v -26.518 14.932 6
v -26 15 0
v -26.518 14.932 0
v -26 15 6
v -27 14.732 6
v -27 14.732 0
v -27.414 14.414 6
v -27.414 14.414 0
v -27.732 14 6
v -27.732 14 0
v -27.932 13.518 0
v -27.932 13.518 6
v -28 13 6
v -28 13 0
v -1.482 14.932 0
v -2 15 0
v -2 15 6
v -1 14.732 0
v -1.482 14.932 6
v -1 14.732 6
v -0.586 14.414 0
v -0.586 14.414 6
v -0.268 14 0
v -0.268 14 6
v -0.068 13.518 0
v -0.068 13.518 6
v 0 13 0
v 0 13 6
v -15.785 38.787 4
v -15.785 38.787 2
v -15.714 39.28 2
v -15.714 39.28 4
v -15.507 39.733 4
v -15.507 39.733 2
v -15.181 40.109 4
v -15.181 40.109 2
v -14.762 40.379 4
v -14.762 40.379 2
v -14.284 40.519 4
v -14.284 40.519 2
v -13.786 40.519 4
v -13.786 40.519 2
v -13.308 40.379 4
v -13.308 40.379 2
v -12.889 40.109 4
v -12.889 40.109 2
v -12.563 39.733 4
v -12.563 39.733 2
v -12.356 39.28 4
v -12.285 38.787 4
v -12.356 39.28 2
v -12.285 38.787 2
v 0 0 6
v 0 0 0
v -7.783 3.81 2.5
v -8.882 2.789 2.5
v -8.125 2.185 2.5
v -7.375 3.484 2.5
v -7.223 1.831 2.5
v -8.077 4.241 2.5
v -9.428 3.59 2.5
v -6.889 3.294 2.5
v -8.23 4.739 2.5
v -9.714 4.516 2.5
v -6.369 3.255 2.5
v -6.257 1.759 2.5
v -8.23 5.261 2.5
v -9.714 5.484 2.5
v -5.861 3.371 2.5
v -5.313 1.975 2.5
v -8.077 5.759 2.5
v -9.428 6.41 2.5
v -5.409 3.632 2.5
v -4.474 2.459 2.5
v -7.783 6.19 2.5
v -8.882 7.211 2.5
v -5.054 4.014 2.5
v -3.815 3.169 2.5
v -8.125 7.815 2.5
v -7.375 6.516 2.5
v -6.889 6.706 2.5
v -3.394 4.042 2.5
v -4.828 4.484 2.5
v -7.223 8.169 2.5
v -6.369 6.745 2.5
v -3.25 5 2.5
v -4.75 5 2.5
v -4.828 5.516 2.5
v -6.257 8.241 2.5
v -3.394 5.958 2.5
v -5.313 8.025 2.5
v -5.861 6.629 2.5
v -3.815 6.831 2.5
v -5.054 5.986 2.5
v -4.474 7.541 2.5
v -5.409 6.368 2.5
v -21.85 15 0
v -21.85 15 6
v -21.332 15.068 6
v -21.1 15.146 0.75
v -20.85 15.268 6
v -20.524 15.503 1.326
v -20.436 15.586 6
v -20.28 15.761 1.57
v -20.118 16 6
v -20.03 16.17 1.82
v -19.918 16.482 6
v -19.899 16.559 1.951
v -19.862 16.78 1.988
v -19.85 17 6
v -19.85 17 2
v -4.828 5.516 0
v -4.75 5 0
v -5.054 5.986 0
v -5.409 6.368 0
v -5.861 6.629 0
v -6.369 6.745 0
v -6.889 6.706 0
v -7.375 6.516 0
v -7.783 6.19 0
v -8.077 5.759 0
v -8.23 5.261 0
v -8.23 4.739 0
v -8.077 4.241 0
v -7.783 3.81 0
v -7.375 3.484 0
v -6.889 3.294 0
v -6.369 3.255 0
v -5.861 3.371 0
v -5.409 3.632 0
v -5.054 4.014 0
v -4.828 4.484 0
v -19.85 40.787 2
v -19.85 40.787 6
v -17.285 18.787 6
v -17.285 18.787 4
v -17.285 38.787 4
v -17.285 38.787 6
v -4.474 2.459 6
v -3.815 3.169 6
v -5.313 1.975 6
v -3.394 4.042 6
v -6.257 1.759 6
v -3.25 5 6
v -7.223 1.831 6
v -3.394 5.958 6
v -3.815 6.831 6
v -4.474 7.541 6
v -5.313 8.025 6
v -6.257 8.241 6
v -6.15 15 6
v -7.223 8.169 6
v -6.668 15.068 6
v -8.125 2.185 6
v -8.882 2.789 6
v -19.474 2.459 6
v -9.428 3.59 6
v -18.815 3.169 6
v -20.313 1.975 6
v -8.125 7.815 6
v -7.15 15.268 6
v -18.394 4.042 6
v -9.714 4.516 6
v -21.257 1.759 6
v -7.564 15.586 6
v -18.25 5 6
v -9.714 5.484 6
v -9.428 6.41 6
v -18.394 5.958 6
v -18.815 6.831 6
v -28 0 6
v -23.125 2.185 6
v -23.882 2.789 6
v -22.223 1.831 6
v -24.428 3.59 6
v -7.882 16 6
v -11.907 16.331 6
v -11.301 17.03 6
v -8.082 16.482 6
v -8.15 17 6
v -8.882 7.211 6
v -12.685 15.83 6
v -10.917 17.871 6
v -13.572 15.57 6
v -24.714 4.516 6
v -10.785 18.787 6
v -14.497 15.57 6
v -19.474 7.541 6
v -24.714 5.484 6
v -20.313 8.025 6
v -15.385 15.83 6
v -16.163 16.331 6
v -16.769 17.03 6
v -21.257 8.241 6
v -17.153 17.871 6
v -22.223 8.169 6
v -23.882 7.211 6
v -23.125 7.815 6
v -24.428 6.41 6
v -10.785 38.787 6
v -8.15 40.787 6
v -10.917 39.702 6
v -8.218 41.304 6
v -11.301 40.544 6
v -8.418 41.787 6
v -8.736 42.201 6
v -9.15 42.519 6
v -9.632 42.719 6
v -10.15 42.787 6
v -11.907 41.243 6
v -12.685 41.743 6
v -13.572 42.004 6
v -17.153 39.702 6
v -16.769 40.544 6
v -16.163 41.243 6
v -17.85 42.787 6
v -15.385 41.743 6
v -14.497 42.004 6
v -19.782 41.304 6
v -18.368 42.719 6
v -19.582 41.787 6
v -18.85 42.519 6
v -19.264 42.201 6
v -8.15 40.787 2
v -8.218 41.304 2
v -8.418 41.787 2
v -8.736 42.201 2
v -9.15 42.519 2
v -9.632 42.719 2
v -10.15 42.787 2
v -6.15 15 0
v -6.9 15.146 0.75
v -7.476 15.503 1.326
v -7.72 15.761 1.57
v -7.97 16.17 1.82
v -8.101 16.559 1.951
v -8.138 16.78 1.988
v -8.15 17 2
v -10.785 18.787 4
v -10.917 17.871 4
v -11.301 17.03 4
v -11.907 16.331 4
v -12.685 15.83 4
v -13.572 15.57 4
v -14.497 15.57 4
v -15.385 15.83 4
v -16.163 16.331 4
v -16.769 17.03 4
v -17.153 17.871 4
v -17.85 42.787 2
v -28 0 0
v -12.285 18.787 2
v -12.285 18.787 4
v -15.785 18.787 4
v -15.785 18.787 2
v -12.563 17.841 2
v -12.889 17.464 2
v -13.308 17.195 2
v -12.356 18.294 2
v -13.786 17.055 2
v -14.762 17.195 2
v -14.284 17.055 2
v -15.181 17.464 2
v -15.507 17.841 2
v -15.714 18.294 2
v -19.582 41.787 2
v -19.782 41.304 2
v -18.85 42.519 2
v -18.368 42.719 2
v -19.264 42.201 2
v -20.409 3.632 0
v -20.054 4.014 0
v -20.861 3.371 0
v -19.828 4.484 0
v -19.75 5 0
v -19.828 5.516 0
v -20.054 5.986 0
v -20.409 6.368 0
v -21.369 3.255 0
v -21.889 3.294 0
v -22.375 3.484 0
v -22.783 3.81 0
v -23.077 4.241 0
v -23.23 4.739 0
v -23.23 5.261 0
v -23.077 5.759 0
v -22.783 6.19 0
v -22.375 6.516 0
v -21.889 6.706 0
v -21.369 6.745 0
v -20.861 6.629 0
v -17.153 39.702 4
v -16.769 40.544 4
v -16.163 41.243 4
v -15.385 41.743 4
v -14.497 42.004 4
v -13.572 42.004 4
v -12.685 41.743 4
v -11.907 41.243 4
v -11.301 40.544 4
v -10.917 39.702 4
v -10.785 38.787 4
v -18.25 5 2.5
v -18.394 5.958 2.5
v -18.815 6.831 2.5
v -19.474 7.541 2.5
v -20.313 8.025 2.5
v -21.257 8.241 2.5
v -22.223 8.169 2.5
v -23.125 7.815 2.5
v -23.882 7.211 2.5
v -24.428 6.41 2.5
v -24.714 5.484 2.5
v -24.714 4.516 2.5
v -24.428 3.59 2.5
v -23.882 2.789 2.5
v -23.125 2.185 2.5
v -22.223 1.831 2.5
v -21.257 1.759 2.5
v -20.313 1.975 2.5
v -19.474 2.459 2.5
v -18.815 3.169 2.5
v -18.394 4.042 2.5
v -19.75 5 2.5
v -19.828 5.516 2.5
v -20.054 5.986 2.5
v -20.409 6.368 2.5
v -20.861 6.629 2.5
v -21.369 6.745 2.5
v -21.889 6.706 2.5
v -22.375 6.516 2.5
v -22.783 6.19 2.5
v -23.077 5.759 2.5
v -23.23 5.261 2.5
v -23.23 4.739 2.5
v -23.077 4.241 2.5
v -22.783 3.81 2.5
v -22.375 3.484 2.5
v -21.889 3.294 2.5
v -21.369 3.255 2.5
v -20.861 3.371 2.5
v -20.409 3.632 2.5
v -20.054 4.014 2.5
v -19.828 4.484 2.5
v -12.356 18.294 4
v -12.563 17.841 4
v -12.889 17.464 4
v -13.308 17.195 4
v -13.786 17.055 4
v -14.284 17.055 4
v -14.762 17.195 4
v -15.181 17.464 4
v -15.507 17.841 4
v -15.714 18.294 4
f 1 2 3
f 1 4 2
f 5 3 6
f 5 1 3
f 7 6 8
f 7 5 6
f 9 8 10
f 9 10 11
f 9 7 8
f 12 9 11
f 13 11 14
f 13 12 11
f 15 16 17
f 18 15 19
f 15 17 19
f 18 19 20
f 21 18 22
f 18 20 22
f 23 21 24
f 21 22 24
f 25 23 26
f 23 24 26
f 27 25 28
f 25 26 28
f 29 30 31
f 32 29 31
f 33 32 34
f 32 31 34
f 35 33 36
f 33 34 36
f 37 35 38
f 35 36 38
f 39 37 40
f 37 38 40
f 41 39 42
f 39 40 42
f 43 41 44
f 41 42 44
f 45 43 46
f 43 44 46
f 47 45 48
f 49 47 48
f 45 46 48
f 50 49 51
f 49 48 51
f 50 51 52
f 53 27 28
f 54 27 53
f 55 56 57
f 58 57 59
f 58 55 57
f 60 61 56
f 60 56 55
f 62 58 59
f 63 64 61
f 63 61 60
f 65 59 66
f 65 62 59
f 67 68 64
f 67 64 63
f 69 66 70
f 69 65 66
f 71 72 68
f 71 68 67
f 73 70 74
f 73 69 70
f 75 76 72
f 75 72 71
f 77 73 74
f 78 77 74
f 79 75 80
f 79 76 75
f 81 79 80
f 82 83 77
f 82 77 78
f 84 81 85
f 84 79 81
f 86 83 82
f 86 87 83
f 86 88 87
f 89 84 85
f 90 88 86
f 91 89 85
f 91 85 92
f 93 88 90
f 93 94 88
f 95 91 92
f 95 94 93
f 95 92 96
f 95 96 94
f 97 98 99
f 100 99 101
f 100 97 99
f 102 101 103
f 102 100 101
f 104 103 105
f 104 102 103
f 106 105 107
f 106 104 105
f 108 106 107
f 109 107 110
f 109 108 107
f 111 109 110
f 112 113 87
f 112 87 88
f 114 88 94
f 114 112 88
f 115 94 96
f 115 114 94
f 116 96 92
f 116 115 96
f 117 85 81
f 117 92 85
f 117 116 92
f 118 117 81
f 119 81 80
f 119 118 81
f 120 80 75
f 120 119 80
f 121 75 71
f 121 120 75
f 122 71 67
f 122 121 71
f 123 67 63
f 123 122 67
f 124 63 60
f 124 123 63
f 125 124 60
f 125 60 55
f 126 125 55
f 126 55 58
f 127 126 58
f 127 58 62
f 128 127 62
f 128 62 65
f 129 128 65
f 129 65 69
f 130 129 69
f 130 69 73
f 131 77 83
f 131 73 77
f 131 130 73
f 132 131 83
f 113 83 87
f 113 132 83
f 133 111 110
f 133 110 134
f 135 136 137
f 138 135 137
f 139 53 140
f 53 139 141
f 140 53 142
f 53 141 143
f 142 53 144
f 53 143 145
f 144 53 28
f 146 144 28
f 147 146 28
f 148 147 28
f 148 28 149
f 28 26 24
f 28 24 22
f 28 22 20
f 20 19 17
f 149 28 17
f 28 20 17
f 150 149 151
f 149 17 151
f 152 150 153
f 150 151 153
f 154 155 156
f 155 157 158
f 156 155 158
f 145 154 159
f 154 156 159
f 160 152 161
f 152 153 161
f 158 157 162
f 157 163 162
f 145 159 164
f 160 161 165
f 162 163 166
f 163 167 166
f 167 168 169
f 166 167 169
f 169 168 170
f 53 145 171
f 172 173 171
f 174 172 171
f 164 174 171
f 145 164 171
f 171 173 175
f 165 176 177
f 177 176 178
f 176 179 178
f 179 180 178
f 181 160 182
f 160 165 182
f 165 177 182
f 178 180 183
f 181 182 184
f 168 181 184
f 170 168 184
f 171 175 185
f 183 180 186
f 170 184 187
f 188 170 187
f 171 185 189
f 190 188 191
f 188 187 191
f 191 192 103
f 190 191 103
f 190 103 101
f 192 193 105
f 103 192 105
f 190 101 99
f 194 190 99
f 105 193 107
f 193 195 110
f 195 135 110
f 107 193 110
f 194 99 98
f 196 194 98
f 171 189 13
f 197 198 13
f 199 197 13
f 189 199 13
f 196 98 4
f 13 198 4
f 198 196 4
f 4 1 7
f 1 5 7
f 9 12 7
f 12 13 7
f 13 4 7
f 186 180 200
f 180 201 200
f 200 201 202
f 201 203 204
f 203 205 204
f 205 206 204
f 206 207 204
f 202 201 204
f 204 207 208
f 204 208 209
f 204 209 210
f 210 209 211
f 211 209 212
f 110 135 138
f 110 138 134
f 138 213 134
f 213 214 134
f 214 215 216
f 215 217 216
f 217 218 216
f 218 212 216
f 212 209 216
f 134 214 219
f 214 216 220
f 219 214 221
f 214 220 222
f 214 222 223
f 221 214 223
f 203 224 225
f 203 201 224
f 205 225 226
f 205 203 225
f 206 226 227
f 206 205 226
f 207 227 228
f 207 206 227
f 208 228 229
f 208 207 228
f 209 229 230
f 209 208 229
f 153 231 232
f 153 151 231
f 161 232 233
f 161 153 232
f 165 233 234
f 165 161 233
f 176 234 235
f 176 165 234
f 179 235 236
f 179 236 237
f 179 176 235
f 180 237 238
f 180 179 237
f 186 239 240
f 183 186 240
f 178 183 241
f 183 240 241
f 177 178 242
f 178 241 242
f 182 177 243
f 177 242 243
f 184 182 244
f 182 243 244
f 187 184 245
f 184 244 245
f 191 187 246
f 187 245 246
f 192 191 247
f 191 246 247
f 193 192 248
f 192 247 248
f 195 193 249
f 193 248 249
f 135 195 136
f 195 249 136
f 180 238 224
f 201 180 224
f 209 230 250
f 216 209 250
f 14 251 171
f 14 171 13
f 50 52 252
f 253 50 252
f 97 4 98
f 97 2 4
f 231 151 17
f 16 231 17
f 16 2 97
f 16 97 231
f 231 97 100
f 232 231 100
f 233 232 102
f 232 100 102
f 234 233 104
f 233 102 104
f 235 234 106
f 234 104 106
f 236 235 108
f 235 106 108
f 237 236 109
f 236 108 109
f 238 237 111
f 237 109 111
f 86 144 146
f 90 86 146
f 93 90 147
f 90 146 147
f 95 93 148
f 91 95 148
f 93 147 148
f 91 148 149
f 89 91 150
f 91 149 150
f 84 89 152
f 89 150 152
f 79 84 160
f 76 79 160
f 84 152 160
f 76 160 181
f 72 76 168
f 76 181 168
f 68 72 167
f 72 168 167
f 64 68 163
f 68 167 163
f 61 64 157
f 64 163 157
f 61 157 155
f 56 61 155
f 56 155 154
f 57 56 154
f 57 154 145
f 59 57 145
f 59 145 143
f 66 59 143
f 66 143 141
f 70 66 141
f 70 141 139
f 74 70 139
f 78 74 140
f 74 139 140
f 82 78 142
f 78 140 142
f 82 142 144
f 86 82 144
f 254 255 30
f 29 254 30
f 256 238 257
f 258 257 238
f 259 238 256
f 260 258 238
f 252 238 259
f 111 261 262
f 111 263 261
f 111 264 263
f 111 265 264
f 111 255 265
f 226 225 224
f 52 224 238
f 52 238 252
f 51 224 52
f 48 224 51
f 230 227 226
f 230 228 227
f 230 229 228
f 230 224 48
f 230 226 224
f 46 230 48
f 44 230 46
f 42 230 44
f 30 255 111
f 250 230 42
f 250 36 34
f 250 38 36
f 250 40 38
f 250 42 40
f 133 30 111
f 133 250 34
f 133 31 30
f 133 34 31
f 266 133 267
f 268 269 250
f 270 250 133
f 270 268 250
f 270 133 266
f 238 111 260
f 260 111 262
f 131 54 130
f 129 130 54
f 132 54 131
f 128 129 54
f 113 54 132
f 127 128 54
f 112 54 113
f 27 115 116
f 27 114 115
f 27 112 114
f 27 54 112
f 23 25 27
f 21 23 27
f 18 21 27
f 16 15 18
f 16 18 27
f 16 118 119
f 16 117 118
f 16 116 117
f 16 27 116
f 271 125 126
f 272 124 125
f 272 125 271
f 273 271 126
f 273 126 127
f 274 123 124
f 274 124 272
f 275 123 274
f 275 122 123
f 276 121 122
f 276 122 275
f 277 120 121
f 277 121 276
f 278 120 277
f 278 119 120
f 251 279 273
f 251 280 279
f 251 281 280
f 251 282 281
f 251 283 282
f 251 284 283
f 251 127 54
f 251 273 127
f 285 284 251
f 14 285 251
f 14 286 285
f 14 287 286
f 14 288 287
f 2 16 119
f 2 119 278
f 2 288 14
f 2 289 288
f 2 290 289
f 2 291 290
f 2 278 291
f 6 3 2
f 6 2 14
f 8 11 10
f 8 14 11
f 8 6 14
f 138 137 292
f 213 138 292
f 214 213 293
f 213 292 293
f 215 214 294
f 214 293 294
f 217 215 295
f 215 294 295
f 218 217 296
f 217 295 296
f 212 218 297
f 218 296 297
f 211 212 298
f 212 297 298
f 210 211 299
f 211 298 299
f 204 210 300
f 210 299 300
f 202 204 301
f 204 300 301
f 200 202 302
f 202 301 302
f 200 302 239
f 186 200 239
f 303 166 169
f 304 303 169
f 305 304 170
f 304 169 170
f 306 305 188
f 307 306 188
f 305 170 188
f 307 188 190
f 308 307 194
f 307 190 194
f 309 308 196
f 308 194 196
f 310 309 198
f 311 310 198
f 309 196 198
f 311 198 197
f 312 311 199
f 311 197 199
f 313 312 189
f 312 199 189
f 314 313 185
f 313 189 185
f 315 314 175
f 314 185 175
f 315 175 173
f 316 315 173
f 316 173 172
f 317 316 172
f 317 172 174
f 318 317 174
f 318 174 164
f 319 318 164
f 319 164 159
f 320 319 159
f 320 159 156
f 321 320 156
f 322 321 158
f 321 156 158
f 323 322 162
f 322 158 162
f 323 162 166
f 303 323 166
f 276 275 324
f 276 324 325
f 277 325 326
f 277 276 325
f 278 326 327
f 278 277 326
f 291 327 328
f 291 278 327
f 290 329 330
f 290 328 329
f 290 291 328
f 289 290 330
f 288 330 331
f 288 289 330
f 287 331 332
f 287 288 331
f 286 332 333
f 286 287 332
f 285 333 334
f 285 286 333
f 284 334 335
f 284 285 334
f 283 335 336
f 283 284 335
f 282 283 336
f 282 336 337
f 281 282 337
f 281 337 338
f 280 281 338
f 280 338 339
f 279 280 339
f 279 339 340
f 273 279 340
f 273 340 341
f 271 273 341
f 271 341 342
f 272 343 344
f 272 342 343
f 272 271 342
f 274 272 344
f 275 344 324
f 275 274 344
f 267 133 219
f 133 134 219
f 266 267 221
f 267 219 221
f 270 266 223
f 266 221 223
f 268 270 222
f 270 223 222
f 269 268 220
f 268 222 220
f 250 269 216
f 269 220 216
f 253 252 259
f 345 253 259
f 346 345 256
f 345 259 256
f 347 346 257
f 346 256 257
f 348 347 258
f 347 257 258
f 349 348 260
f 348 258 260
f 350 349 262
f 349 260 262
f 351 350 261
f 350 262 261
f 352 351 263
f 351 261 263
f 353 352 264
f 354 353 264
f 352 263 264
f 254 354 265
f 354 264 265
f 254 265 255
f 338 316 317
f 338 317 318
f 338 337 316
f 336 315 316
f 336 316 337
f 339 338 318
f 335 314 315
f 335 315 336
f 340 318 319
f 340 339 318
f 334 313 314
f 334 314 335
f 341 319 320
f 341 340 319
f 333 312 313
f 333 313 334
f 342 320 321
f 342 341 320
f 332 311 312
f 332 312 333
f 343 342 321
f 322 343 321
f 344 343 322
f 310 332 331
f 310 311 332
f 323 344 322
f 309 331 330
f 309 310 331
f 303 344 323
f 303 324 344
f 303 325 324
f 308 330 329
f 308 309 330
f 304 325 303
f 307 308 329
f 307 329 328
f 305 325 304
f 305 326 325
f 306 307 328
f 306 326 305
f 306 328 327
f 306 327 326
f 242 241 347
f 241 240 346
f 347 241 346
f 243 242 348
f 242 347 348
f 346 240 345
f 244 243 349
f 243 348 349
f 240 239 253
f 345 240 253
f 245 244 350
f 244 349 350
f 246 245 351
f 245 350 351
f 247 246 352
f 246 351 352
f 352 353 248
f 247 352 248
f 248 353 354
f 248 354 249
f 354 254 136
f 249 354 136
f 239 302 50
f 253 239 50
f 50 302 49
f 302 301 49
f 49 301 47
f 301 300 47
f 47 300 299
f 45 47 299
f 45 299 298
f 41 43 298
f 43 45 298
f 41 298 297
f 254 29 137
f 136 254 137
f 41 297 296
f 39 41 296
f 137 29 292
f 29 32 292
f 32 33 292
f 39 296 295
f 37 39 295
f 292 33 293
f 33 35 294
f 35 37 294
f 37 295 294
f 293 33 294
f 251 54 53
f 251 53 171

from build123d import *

# Parameters (mm, degrees)
BOSS_EXTRUDE1_DEPTH     = 6
CUT_EXTRUDE1_DEPTH      = 33.32645975048922
CUT_EXTRUDE1_DEPTH_BACK = 33.32645975048922
SKETCH3_R               = 1.7500000000000002
SKETCH3_R_2             = 1.7499999999999998
SKETCH6_R               = 3.2500000000000004
SKETCH6_R_2             = 3.25
CUT_EXTRUDE2_DEPTH      = 3.5
SKETCH7_W               = 11.699999999999998
SKETCH7_H               = 27.786688839798195
BOSS_EXTRUDE2_DEPTH     = 6
SKETCH8_W               = 11.699999999999998
SKETCH8_H               = 27.786688839798195
CUT_EXTRUDE3_DEPTH      = 2
FILLET1_R               = 2
FILLET2_R               = 2
FILLET3_R               = 2
CUT_EXTRUDE4_DEPTH      = 52.48495646180262
CUT_EXTRUDE4_DEPTH_BACK = 52.48495646180262
CUT_EXTRUDE5_DEPTH      = 52.48495646180262
CUT_EXTRUDE5_DEPTH_BACK = 2
FILLET4_R               = 2
FILLET5_R               = 2


with BuildPart() as part:
    # Sketch2 → Boss-Extrude1 (new body)
    with BuildSketch(Plane.XY):
        Polygon((-27.999999999999996, 15), (1.84e-15, 15), (0, 0), (-27.999999999999996, 0), align=None)
    extrude(amount=BOSS_EXTRUDE1_DEPTH)

    # Sketch3 → Cut-Extrude1 (cut, two sides: drawn at the far end of the back side and taken through both)
    with BuildSketch(Plane.XY.offset(6).offset(-CUT_EXTRUDE1_DEPTH_BACK)):
        with Locations((-21.5, 4.999999999999999)):
            Circle(SKETCH3_R)
        with Locations((-6.5, 4.999999999999999)):
            Circle(SKETCH3_R_2)
    extrude(amount=CUT_EXTRUDE1_DEPTH + CUT_EXTRUDE1_DEPTH_BACK, mode=Mode.SUBTRACT)

    # Sketch6 → Cut-Extrude2 (cut)
    with BuildSketch(Plane.XY.offset(6)):
        with Locations((-21.5, 4.999999999999999)):
            Circle(SKETCH6_R)
        with Locations((-6.500000000000001, 4.999999999999999)):
            Circle(SKETCH6_R_2)
    extrude(amount=-CUT_EXTRUDE2_DEPTH, mode=Mode.SUBTRACT)

    # Sketch7 → Boss-Extrude2 (add)
    with BuildSketch(Plane(origin=(0, 0, 0), x_dir=(-1, 0, 0), z_dir=(0, 0, -1))):
        with Locations((14, 28.893344419899098)):
            Rectangle(SKETCH7_W, SKETCH7_H)
    extrude(amount=-BOSS_EXTRUDE2_DEPTH)

    # Sketch8 → Cut-Extrude3 (cut)
    with BuildSketch(Plane(origin=(0, 0, 0), x_dir=(-1, 0, 0), z_dir=(0, 0, -1))):
        with Locations((14, 28.893344419899098)):
            Rectangle(SKETCH8_W, SKETCH8_H)
    extrude(amount=-CUT_EXTRUDE3_DEPTH, mode=Mode.SUBTRACT)

    # Fillet1
    fillet1_edges = [part.edges().sort_by_distance(p)[0] for p in [
        (-14, 15, 2),
    ]]
    fillet(fillet1_edges, radius=FILLET1_R - 0.0001)  # a hair under: the kernel refuses the full size

    # Fillet2
    fillet2_edges = [part.edges().sort_by_distance(p)[0] for p in [
        (-8.15, 15, 3.0000500000000003),
    ]]
    fillet(fillet2_edges, radius=FILLET2_R)

    # Fillet3
    fillet3_edges = [part.edges().sort_by_distance(p)[0] for p in [
        (-19.849999999999998, 15, 3.00005),
    ]]
    fillet(fillet3_edges, radius=FILLET3_R)

    # Sketch9 → Cut-Extrude4 (cut, two sides: drawn at the far end of the back side and taken through both)
    with BuildSketch(Plane.XY.offset(6).offset(-CUT_EXTRUDE4_DEPTH_BACK)):
        with BuildLine():
            Line((-12.28493666219322, 38.78668883979819), (-12.284936662193216, 18.786688839798188))
            ThreePointArc((-12.284936662193216, 18.786688839798188), (-14.034936662193216, 17.036688839798188), (-15.784936662193216, 18.786688839798188))
            Line((-15.784936662193216, 18.786688839798188), (-15.78493666219322, 38.78668883979819))
            ThreePointArc((-15.78493666219322, 38.78668883979819), (-14.03493666219322, 40.53668883979819), (-12.28493666219322, 38.78668883979819))
        make_face()
    extrude(amount=CUT_EXTRUDE4_DEPTH + CUT_EXTRUDE4_DEPTH_BACK, mode=Mode.SUBTRACT)

    # Sketch10 → Cut-Extrude5 (cut, two sides: drawn at the far end of the back side and taken through both)
    with BuildSketch(Plane.XY.offset(6).offset(-CUT_EXTRUDE5_DEPTH_BACK)):
        with BuildLine():
            Line((-10.784936662193223, 38.78668883979819), (-10.78493666219322, 18.786688839798188))
            ThreePointArc((-10.78493666219322, 18.786688839798188), (-14.034936662193216, 15.536688839798186), (-17.284936662193218, 18.786688839798188))
            Line((-17.284936662193218, 18.786688839798188), (-17.284936662193218, 38.78668883979819))
            ThreePointArc((-17.284936662193218, 38.78668883979819), (-14.03493666219322, 42.03668883979819), (-10.784936662193223, 38.78668883979819))
        make_face()
    extrude(amount=CUT_EXTRUDE5_DEPTH + CUT_EXTRUDE5_DEPTH_BACK, mode=Mode.SUBTRACT)

    # Fillet4
    fillet4_edges = [part.edges().sort_by_distance(p)[0] for p in [
        (-8.15, 42.786688839798195, 4),
        (-19.849999999999998, 42.786688839798195, 4),
    ]]
    fillet(fillet4_edges, radius=FILLET4_R)

    # Fillet5
    fillet5_edges = [part.edges().sort_by_distance(p)[0] for p in [
        (-27.999999999999996, 15, 3),
        (1.84e-15, 15, 3),
    ]]
    fillet(fillet5_edges, radius=FILLET5_R)


solid = part.part
